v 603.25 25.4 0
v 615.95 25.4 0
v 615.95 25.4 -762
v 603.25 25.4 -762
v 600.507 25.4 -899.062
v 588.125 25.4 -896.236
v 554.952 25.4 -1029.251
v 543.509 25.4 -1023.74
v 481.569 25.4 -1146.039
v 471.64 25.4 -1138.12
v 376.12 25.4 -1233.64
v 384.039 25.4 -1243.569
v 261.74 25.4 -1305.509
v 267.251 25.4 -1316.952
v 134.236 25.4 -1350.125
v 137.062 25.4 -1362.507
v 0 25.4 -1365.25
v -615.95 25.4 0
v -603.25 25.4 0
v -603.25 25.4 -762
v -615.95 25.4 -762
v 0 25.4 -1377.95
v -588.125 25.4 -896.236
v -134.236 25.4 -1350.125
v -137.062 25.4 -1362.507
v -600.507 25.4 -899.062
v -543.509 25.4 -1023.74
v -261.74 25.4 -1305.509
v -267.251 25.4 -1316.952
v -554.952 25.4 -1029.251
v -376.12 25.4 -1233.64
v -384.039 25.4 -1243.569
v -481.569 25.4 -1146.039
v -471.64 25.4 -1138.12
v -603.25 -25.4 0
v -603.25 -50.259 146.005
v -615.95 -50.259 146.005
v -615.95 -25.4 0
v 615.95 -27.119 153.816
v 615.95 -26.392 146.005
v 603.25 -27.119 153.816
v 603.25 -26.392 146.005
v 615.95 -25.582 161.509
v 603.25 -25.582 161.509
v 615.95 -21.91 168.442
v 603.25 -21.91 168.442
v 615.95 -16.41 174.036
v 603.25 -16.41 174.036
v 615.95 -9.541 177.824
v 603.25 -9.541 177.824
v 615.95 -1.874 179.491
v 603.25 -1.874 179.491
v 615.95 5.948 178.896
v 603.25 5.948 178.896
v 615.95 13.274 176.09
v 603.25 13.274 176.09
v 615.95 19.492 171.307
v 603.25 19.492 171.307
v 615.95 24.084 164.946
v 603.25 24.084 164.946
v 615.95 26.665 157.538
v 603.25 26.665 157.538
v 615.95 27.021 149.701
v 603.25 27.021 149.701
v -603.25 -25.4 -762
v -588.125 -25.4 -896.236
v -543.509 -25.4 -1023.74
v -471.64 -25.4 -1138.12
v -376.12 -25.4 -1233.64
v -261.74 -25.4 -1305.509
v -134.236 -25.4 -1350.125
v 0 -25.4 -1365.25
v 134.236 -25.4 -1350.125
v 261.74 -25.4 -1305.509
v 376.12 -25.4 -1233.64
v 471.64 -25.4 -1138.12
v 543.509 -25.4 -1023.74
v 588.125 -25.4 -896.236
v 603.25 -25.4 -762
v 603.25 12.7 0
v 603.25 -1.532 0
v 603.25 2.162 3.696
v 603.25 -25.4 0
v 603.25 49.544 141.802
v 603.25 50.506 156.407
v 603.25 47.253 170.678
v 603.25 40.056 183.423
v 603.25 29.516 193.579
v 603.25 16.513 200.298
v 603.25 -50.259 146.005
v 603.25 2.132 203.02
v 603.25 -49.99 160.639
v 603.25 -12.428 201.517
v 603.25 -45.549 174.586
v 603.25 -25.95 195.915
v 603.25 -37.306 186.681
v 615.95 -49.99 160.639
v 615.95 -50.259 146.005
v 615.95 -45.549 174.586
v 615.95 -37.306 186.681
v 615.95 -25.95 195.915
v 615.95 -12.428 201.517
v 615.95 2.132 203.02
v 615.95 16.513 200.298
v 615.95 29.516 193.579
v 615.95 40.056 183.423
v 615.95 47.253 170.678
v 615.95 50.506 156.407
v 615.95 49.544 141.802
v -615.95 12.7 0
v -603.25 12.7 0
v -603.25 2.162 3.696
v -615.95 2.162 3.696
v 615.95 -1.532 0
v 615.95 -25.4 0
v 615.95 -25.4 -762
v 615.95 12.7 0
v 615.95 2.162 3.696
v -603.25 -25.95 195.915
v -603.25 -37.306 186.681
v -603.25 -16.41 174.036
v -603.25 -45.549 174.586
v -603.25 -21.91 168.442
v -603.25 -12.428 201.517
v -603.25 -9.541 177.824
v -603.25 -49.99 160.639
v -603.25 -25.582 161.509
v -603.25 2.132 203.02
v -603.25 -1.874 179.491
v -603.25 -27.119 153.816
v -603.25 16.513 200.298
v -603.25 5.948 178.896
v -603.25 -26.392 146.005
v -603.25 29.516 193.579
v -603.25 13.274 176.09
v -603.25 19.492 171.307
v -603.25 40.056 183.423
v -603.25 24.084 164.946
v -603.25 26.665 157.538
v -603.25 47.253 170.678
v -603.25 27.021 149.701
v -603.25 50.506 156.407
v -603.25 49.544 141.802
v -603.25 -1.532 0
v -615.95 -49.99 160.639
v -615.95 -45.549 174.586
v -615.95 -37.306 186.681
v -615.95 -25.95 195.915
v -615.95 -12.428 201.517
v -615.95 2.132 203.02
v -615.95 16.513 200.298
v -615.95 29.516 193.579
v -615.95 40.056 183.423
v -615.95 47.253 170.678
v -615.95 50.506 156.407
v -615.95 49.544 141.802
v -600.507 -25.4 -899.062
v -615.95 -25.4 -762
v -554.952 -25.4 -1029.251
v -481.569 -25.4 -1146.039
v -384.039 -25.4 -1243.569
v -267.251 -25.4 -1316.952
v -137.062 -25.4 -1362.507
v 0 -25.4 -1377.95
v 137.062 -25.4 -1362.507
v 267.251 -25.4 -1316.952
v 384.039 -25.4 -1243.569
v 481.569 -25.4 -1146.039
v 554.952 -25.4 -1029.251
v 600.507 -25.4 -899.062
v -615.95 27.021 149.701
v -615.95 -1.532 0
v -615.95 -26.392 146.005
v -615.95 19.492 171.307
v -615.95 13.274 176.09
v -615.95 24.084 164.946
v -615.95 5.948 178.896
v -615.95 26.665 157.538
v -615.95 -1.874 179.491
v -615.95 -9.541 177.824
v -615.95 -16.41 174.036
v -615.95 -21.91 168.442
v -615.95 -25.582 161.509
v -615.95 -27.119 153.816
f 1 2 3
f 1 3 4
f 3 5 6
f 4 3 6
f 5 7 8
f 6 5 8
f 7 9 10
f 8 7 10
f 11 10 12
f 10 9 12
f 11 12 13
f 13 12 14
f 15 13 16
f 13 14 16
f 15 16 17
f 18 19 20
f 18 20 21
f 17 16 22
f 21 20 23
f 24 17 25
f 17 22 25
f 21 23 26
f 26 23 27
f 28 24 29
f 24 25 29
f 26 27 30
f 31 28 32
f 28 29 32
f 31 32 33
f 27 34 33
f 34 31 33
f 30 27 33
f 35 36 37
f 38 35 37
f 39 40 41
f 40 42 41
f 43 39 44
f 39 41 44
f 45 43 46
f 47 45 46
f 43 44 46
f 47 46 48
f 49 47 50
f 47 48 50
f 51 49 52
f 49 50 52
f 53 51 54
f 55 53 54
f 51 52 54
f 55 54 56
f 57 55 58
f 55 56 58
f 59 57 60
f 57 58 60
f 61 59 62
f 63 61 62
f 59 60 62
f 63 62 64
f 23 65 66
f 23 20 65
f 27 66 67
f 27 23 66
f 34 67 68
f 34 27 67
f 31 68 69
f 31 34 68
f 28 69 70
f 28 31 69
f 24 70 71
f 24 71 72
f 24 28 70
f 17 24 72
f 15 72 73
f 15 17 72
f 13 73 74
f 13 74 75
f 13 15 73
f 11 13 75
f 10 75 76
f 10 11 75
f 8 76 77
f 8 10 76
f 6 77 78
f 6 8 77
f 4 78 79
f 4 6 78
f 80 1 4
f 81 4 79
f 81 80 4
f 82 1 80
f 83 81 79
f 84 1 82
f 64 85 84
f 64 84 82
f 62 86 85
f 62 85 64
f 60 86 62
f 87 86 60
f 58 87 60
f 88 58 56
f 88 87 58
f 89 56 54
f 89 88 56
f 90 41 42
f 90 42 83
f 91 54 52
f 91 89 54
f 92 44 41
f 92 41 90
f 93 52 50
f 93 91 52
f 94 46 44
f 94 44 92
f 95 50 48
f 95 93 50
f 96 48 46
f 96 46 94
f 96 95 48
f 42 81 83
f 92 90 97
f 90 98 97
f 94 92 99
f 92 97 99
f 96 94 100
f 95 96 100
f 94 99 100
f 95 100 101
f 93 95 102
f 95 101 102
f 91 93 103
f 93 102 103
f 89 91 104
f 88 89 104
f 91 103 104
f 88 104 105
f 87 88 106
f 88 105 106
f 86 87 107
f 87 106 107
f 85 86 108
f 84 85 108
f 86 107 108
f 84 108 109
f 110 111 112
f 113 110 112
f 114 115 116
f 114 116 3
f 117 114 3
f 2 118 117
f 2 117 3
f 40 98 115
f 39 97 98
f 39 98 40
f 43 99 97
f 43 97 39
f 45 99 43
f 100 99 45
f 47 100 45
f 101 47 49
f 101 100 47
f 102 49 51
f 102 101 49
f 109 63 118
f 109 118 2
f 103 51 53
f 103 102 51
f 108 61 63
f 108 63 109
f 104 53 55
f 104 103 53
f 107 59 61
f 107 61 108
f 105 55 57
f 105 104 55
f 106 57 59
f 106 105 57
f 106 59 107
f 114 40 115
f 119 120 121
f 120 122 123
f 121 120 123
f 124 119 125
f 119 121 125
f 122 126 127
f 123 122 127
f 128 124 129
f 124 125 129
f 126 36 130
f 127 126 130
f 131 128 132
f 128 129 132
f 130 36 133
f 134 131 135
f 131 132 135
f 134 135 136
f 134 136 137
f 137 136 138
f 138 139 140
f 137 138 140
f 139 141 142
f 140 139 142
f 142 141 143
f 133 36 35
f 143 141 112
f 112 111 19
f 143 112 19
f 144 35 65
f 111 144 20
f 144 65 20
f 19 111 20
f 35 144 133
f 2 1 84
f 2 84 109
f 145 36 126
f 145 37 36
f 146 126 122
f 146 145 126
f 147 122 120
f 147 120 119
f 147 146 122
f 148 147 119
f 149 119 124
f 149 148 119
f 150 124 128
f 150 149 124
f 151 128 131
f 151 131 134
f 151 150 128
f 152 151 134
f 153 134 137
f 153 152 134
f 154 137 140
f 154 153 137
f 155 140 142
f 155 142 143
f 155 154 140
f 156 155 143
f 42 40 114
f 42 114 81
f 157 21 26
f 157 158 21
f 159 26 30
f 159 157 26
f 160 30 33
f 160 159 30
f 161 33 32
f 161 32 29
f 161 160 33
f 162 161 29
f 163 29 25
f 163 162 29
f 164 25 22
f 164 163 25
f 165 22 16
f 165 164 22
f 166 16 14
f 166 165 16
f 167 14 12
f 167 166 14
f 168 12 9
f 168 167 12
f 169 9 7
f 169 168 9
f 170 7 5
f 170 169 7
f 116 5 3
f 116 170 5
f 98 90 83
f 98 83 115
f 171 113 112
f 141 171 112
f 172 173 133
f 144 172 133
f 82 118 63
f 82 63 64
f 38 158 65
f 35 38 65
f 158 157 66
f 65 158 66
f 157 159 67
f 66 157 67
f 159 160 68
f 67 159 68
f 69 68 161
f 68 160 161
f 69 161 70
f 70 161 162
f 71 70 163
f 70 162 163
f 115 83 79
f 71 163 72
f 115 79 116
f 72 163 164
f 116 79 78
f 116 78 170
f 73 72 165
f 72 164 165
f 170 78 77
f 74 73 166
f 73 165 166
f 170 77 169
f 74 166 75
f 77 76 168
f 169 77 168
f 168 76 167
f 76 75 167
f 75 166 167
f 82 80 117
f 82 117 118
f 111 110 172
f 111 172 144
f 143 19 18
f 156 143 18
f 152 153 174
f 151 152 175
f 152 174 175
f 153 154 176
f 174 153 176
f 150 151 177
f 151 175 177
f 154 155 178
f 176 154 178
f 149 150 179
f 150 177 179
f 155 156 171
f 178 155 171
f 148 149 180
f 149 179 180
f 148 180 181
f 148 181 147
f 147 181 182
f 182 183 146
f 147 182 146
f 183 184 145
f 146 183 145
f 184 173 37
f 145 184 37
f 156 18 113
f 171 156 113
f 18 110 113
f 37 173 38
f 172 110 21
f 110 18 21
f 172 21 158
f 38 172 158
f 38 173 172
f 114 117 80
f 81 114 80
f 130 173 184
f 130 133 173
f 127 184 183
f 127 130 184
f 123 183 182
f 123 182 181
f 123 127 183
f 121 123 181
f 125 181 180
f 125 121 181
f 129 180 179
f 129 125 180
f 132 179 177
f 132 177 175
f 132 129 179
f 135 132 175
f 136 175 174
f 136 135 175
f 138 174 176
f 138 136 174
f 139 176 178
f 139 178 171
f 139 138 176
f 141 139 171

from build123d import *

# Parameters (mm, degrees)
F1_W = 12.7
F1_H = 50.8
F5_W = 12.7
F5_H = 23.8677083557


with BuildPart() as f2:
    # F2: sweep along a path in F0
    with BuildLine(Plane.XZ) as f2_path:
        Line((-609.6, 0), (-609.6, -762))
        ThreePointArc((-609.6, -762), (0, -1371.6), (609.6, -762))
        Line((609.6, -762), (609.6, 0))
    # F1 (on Top) → F2 (sweep)
    with BuildSketch(Plane.XY):
        with Locations((-609.6, 0)):
            Rectangle(F1_W, F1_H)
    sweep(path=f2_path.line)

    # F6: sweep along a path in F4
    with BuildLine(Plane.YZ.offset(609.6)) as f6_path:
        Line((-12.7, 0), (-37.5594649148, 146.0049554096))
        ThreePointArc((-37.5594649148, 146.0049554096), (0, 190.5), (37.5594649148, 146.0049554096))
        Line((37.5594649148, 146.0049554096), (12.7, 0))
    # F5 (on face) → F6 (sweep)
    with BuildSketch(Plane.XY):
        with Locations((609.6, -13.4661458221)):
            Rectangle(F5_W, F5_H)
    sweep(path=f6_path.line)

    # F7: F2 across plane


with BuildPart() as f2_1:
    add(f2.part)
    add(f2.part.mirror(Plane.YZ))


solid = f2_1.part
